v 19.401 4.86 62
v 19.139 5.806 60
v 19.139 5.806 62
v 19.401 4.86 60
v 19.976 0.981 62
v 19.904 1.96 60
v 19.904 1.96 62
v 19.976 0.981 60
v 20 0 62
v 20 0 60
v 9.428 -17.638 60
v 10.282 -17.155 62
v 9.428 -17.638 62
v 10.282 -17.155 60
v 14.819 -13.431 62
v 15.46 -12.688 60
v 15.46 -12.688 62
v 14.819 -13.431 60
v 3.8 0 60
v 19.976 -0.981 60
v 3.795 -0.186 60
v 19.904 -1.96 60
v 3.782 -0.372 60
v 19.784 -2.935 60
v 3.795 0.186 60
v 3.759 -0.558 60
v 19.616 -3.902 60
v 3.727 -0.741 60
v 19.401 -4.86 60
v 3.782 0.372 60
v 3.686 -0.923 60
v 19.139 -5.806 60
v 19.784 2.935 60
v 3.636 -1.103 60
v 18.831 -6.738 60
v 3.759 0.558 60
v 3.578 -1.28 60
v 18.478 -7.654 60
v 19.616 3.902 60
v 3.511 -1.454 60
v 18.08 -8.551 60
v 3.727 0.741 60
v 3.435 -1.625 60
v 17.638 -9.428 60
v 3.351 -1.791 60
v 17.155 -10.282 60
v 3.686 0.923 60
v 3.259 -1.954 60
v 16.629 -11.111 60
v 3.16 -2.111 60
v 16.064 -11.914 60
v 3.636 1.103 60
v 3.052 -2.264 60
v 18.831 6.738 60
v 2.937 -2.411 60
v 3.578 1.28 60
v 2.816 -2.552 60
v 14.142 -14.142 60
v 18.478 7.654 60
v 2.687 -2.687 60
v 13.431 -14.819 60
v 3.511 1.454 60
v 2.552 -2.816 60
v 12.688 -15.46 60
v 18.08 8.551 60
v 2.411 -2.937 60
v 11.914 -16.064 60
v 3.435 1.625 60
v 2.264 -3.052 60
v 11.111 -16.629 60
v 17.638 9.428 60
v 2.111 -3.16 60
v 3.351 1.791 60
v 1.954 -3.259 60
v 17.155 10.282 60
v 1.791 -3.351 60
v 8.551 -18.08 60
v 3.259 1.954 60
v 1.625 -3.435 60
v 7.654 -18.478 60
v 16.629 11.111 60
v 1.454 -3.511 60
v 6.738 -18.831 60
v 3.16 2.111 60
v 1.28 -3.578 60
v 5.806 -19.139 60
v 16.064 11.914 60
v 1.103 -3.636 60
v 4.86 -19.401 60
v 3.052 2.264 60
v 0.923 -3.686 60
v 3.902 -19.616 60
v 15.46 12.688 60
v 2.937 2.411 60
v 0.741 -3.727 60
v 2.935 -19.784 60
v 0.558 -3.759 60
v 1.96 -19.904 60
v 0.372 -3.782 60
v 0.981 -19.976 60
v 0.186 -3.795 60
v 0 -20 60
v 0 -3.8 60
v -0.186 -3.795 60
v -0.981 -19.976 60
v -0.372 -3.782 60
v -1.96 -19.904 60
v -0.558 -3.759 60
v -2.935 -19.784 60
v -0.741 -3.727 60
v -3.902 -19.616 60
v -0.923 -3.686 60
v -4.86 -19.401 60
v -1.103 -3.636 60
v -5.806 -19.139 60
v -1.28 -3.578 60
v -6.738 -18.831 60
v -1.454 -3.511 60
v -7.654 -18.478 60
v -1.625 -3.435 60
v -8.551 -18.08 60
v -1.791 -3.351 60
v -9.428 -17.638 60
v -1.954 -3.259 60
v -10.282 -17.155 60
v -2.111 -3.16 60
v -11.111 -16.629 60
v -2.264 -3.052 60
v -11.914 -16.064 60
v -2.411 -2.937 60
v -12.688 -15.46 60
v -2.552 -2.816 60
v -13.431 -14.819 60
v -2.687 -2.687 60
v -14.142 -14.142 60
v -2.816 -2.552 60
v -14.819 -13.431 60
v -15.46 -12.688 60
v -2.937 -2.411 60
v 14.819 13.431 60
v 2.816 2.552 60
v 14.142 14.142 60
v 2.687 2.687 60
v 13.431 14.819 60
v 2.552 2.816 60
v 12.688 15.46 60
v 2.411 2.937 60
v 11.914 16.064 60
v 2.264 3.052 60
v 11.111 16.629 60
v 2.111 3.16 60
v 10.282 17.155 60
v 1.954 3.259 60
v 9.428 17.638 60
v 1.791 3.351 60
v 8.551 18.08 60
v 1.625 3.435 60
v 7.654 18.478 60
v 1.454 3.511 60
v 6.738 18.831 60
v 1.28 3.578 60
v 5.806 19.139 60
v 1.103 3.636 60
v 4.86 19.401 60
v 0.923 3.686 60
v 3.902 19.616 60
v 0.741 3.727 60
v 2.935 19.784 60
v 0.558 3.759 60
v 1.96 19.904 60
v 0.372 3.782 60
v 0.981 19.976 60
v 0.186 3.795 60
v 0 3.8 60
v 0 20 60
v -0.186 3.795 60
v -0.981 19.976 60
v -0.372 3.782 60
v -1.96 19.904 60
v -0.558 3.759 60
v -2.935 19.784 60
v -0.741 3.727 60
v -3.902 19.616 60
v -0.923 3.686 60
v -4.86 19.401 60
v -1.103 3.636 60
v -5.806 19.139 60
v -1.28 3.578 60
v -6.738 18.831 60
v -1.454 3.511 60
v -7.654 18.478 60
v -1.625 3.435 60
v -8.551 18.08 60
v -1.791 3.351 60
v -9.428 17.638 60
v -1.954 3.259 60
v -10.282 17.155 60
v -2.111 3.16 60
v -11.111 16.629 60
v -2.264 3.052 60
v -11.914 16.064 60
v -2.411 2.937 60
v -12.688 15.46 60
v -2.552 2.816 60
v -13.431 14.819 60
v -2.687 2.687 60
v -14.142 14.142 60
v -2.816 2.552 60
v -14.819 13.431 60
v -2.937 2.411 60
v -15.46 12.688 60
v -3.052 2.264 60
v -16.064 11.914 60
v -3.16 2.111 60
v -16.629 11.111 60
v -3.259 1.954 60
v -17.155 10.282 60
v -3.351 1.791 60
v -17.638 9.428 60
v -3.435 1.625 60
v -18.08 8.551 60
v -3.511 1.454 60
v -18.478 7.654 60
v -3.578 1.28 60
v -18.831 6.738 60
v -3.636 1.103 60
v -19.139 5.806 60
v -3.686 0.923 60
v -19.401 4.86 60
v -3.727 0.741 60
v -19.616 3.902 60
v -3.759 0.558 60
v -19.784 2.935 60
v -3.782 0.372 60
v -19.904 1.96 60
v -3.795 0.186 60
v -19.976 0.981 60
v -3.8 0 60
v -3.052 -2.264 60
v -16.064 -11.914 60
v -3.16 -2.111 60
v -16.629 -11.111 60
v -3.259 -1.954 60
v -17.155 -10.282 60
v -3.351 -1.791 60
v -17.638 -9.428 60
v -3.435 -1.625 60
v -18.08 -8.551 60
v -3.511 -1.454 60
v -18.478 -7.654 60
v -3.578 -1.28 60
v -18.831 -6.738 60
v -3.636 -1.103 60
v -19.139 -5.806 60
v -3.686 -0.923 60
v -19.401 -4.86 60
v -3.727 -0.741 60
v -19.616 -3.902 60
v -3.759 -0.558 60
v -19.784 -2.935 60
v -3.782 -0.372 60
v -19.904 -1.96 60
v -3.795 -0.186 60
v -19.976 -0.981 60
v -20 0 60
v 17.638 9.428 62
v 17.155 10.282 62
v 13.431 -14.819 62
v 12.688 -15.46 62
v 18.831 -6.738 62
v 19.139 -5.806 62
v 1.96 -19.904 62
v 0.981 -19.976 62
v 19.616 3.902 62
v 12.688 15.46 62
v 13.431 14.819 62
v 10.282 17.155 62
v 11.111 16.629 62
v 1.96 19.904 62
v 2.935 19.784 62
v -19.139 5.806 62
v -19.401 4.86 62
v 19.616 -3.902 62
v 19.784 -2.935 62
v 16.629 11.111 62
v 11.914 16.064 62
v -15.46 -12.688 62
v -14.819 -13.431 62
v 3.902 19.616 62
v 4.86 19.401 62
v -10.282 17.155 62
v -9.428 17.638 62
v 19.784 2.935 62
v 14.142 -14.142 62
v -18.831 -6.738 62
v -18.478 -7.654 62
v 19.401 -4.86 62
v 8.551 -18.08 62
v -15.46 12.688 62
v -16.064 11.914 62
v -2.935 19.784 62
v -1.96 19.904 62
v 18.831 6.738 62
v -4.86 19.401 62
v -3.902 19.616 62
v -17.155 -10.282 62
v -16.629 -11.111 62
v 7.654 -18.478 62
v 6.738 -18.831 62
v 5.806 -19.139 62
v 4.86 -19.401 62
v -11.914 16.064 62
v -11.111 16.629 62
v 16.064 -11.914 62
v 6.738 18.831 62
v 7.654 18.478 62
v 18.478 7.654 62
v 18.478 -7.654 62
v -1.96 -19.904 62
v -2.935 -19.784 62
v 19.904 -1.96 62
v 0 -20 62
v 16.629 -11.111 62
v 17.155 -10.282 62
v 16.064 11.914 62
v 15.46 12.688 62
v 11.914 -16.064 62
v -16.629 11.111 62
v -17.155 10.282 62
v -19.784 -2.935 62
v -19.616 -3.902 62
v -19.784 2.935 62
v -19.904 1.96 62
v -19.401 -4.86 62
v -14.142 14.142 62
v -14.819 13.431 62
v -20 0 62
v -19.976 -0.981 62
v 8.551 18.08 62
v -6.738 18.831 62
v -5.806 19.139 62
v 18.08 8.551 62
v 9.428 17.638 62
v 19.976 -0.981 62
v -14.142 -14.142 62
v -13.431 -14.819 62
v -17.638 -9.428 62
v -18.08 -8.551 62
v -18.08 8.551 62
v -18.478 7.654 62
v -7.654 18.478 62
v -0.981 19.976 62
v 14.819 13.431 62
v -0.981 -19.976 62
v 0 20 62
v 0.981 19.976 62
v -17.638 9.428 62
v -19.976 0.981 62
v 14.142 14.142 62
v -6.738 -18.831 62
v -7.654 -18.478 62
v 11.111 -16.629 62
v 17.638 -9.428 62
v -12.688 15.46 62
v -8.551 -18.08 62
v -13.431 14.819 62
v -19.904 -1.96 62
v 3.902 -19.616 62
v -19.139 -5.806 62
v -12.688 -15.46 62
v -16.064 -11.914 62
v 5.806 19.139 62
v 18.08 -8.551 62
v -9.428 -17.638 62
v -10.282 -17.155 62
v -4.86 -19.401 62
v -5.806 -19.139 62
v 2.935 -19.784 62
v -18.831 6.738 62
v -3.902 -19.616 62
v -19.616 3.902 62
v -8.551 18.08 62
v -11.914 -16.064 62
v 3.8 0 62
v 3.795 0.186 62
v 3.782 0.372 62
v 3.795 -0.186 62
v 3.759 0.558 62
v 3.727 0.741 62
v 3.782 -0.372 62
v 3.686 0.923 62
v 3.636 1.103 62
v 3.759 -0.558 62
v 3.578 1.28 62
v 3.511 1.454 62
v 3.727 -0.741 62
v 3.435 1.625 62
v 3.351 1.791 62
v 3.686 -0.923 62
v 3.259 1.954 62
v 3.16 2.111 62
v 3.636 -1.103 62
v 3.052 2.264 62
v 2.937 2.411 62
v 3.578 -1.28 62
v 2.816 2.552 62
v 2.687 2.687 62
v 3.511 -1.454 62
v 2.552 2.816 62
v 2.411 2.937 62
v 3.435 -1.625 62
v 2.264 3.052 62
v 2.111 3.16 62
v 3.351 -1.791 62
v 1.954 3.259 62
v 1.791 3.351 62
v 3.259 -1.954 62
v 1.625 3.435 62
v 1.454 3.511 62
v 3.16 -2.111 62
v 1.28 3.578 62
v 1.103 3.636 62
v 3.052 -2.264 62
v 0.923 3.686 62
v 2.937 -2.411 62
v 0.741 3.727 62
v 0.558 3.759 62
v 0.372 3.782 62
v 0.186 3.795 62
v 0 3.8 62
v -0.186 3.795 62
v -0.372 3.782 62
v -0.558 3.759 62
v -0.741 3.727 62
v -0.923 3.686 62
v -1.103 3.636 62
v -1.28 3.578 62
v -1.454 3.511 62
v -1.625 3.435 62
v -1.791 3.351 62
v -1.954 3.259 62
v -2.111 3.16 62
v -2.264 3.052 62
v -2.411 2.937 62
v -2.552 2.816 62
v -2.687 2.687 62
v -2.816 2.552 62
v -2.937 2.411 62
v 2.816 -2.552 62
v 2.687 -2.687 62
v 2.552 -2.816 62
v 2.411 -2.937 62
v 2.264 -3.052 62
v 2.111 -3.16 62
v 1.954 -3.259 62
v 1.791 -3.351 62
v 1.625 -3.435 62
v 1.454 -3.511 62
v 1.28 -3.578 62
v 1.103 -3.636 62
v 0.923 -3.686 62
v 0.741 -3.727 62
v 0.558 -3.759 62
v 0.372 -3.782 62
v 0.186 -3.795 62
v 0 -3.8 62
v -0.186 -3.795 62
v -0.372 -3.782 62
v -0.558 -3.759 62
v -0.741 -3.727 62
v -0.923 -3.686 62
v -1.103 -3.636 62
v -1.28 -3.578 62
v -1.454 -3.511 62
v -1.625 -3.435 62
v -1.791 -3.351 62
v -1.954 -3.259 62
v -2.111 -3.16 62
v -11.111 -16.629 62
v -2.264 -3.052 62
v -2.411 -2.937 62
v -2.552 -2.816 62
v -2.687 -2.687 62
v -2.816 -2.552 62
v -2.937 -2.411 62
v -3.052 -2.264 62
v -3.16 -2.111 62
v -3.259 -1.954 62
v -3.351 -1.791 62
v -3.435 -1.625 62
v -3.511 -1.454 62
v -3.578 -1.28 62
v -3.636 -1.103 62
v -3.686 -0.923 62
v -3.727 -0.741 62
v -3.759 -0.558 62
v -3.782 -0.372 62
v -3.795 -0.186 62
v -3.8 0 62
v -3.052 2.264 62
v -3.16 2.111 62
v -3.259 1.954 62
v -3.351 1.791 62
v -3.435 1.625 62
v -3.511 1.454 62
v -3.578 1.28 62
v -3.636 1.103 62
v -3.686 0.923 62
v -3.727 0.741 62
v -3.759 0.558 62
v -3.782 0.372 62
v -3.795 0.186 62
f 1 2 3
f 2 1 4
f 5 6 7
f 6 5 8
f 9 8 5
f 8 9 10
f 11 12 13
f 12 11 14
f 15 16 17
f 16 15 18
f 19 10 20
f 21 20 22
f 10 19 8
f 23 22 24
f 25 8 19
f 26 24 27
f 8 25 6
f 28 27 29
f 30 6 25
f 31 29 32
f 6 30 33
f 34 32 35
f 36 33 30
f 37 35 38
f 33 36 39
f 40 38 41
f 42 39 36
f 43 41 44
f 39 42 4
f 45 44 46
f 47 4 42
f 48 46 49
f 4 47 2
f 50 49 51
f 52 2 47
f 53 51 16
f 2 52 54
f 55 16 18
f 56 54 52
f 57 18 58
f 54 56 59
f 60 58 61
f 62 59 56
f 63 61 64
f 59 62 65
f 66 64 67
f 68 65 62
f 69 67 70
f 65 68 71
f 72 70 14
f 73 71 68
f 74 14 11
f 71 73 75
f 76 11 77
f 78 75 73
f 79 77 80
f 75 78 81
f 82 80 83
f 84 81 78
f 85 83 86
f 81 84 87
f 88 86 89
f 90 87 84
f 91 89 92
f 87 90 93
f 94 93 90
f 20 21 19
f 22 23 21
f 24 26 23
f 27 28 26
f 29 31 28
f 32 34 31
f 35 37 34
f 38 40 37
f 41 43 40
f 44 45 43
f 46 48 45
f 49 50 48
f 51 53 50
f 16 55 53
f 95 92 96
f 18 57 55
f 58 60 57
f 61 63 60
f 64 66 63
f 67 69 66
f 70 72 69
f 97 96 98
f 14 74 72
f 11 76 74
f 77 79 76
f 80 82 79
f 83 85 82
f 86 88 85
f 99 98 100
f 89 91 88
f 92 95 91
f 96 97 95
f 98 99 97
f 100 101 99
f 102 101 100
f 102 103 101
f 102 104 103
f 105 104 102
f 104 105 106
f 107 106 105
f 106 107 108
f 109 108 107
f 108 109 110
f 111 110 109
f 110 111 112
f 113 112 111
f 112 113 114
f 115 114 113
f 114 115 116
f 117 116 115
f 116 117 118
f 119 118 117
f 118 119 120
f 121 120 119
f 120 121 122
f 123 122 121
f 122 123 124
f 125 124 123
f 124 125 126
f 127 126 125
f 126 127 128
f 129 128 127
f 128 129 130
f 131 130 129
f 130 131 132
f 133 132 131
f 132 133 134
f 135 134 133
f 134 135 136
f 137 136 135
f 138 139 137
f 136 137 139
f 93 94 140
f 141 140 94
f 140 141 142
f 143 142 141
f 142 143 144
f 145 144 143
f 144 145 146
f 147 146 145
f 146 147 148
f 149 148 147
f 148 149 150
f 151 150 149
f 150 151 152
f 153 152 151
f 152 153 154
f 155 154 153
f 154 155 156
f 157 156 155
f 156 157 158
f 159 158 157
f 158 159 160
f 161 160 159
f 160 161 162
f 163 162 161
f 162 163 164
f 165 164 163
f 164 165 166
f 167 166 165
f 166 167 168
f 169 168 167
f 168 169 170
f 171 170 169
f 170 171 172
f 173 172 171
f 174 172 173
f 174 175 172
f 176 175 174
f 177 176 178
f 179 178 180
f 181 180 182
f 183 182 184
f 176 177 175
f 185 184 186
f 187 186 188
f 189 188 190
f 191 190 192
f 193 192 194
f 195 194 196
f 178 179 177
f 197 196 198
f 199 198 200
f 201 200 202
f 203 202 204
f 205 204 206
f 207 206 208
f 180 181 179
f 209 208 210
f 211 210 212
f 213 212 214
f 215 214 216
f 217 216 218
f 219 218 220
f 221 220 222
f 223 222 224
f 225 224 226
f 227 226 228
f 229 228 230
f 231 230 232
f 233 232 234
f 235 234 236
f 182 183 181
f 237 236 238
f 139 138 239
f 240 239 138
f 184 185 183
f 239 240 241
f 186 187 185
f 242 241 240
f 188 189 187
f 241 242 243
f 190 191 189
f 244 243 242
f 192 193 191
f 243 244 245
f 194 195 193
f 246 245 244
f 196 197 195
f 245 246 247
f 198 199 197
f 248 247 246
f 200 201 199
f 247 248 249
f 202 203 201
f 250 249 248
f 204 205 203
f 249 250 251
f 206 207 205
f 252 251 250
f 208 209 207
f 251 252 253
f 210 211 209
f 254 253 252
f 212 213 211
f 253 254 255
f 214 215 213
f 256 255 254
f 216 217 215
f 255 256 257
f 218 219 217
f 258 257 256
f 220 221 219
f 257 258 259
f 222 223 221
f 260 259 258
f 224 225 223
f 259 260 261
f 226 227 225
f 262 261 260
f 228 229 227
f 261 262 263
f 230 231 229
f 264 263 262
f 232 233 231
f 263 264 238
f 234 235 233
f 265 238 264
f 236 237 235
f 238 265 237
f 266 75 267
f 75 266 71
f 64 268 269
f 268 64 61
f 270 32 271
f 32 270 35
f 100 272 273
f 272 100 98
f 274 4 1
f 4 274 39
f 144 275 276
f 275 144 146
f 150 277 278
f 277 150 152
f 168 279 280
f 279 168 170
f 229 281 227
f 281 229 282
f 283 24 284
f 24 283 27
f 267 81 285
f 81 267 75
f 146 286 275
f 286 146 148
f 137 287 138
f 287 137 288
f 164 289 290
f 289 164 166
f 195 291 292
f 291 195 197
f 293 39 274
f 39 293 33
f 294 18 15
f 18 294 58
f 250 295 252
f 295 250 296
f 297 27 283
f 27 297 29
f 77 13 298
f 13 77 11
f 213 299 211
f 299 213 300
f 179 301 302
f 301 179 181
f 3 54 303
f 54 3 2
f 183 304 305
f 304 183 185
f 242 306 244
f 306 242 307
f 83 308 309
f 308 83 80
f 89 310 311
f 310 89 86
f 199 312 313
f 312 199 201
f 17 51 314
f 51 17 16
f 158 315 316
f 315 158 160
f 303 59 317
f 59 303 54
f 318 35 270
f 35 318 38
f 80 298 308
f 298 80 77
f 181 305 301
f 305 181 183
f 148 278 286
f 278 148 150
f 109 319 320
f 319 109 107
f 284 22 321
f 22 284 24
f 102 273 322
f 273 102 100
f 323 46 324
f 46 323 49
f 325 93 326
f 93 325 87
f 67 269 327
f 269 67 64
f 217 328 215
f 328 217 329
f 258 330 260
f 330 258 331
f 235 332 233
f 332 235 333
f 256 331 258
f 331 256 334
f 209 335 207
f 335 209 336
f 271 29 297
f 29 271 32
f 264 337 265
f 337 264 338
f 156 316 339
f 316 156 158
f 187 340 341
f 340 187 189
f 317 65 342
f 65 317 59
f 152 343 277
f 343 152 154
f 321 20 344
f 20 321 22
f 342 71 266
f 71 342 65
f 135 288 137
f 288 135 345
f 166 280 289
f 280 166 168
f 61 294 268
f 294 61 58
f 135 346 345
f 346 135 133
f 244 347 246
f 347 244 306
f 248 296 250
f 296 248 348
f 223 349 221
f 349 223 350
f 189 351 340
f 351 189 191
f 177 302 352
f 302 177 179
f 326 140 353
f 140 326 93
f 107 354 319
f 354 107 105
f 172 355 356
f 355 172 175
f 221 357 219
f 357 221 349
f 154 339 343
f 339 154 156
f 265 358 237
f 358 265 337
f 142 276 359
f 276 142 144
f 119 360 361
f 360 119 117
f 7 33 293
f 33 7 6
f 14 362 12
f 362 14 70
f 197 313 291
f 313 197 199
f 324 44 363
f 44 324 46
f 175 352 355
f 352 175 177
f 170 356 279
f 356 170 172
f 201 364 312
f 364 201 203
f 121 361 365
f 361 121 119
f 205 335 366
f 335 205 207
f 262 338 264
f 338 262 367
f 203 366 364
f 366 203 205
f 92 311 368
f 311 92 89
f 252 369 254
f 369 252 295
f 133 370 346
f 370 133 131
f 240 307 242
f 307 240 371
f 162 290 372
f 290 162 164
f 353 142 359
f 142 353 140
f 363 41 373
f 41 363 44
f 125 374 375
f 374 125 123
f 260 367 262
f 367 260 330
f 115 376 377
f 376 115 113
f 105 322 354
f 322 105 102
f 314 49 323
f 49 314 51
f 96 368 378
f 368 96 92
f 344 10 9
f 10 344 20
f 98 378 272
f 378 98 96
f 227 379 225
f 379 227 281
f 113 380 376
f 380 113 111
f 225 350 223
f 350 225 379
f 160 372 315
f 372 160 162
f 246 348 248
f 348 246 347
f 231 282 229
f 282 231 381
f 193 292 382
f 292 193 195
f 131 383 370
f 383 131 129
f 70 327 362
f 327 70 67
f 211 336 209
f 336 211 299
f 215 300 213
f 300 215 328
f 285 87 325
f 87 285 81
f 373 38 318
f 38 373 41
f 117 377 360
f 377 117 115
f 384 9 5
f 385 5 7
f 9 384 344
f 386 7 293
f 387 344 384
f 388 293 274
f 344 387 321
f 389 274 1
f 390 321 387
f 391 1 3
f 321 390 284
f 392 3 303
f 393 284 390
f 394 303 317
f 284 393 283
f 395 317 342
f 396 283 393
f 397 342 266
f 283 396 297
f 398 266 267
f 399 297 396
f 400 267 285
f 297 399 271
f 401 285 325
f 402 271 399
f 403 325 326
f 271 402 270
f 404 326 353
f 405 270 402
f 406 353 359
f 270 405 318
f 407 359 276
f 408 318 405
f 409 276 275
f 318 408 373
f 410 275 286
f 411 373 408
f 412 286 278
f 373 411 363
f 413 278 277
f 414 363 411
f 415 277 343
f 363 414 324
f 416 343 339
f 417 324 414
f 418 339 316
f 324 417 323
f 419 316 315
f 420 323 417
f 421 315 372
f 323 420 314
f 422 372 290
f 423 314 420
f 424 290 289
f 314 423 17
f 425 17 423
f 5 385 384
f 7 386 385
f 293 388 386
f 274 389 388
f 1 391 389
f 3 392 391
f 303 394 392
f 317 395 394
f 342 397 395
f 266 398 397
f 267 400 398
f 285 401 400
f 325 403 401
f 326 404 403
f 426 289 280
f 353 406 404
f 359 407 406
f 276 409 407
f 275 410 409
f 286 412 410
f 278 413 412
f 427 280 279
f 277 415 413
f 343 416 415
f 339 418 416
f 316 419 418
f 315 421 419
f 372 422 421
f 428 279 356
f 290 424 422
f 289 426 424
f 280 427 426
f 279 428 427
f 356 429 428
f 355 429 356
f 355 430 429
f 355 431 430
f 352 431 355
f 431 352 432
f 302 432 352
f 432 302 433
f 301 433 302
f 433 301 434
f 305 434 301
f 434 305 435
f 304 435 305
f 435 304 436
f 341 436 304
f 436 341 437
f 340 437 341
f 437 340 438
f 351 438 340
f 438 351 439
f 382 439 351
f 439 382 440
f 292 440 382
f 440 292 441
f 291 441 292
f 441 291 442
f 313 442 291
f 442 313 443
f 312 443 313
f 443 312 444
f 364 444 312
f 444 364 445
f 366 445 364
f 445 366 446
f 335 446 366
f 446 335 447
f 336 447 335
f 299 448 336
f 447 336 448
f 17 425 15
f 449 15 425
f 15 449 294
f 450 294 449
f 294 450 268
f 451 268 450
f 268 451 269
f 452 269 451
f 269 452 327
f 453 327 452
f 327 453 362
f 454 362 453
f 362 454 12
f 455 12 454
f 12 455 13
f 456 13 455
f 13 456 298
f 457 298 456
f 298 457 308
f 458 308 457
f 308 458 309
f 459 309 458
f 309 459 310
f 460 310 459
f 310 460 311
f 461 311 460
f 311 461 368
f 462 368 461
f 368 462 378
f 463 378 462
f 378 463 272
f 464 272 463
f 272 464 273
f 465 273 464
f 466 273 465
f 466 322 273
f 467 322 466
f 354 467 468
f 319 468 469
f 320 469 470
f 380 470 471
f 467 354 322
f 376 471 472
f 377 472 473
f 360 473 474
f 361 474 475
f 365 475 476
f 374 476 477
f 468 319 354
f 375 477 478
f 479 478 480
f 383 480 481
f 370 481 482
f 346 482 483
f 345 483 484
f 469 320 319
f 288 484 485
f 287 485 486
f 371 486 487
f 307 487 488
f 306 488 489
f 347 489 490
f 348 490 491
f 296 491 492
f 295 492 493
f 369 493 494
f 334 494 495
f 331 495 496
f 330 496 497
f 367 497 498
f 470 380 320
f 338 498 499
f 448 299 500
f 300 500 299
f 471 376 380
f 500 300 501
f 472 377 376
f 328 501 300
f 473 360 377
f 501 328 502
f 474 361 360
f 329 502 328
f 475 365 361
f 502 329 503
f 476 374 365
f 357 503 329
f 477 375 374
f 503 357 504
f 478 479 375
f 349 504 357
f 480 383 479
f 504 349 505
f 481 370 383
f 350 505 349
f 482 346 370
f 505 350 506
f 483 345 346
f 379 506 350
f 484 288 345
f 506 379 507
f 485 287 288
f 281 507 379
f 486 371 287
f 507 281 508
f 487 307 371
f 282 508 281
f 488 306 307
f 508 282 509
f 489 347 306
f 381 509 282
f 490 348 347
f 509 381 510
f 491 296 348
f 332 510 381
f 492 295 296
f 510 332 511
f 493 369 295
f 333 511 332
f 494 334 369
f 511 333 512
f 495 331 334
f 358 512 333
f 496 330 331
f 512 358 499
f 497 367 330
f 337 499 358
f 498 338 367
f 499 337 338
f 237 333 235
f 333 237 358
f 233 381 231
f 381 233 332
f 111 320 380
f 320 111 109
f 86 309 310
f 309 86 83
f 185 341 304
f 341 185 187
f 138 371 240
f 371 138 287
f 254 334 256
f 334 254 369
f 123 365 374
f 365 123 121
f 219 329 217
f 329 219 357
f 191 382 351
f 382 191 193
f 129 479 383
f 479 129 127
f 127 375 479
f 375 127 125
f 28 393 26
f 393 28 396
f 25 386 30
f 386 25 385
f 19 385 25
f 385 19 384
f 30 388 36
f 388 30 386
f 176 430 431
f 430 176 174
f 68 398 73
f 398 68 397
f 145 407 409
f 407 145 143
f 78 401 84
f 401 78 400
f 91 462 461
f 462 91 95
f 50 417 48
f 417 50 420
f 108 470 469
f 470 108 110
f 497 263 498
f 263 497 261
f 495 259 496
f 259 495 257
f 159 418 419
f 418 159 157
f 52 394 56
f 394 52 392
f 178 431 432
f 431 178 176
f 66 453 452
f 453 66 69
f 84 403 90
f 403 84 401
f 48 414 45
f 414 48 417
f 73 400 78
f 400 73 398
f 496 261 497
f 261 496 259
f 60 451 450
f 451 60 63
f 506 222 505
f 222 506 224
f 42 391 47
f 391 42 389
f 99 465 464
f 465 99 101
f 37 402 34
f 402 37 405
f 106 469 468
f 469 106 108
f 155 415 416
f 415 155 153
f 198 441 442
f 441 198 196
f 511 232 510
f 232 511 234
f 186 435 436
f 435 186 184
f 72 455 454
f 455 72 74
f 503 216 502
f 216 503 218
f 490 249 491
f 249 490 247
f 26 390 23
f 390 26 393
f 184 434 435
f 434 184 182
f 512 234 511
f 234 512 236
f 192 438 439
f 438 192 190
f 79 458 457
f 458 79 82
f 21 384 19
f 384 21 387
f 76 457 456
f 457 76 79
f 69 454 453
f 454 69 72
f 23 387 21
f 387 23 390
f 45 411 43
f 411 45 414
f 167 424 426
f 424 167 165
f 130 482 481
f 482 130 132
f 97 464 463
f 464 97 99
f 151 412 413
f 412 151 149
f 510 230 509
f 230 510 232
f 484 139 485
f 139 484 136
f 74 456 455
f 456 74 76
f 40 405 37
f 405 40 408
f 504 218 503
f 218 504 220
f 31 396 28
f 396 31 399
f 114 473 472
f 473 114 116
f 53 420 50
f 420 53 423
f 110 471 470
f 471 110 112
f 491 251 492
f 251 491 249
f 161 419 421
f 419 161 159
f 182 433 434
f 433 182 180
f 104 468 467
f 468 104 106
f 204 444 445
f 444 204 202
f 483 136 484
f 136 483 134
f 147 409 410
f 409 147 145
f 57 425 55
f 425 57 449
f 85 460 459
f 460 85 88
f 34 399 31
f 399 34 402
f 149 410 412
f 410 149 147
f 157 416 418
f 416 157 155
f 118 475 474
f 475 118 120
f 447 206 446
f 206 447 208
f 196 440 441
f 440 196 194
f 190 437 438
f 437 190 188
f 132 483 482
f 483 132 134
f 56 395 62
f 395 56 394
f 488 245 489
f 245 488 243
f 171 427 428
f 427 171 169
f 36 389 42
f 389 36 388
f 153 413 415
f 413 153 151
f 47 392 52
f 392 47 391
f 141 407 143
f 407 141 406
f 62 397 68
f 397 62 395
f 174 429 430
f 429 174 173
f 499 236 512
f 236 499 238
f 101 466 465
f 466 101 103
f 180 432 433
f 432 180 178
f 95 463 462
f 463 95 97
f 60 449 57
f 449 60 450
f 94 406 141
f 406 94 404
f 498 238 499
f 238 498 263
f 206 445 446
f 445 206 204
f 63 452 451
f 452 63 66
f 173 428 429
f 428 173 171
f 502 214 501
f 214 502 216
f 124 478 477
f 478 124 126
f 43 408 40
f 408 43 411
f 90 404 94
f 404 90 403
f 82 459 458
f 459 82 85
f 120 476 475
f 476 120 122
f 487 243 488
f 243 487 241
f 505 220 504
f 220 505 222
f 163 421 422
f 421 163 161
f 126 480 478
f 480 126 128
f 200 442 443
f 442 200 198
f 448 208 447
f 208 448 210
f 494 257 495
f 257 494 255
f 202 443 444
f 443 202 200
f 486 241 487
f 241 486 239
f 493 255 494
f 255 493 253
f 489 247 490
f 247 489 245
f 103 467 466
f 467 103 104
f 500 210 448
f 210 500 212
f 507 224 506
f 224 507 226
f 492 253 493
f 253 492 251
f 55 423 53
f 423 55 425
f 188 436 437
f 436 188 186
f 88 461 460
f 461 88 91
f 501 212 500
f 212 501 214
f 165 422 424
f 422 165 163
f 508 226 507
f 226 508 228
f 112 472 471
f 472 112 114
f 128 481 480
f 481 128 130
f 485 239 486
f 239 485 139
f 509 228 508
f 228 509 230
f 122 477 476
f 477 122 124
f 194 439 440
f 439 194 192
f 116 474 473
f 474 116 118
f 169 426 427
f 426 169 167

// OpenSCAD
// file: common_params.scad
cylinder_radius = 20.000000;
cylinder_height = 60.000000;
wall_thickness = 2.000000;

cap_thickness = 2.000000;

rod_radius = 2.000000;
rod_height = 50.000000;

ring_outer_radius = 8.000000;
ring_inner_radius = 4.000000;
ring_thickness = 3.000000;
ring_z = 40.000000;

$fn = 128;
// main file
include <common_params.scad>;

hole_radius = 3.800000;

translate([0, 0, cylinder_height])
difference() {
    cylinder(h = cap_thickness, r = cylinder_radius);
    translate([0, 0, -0.1])
        cylinder(h = cap_thickness + 0.2, r = hole_radius);
}
